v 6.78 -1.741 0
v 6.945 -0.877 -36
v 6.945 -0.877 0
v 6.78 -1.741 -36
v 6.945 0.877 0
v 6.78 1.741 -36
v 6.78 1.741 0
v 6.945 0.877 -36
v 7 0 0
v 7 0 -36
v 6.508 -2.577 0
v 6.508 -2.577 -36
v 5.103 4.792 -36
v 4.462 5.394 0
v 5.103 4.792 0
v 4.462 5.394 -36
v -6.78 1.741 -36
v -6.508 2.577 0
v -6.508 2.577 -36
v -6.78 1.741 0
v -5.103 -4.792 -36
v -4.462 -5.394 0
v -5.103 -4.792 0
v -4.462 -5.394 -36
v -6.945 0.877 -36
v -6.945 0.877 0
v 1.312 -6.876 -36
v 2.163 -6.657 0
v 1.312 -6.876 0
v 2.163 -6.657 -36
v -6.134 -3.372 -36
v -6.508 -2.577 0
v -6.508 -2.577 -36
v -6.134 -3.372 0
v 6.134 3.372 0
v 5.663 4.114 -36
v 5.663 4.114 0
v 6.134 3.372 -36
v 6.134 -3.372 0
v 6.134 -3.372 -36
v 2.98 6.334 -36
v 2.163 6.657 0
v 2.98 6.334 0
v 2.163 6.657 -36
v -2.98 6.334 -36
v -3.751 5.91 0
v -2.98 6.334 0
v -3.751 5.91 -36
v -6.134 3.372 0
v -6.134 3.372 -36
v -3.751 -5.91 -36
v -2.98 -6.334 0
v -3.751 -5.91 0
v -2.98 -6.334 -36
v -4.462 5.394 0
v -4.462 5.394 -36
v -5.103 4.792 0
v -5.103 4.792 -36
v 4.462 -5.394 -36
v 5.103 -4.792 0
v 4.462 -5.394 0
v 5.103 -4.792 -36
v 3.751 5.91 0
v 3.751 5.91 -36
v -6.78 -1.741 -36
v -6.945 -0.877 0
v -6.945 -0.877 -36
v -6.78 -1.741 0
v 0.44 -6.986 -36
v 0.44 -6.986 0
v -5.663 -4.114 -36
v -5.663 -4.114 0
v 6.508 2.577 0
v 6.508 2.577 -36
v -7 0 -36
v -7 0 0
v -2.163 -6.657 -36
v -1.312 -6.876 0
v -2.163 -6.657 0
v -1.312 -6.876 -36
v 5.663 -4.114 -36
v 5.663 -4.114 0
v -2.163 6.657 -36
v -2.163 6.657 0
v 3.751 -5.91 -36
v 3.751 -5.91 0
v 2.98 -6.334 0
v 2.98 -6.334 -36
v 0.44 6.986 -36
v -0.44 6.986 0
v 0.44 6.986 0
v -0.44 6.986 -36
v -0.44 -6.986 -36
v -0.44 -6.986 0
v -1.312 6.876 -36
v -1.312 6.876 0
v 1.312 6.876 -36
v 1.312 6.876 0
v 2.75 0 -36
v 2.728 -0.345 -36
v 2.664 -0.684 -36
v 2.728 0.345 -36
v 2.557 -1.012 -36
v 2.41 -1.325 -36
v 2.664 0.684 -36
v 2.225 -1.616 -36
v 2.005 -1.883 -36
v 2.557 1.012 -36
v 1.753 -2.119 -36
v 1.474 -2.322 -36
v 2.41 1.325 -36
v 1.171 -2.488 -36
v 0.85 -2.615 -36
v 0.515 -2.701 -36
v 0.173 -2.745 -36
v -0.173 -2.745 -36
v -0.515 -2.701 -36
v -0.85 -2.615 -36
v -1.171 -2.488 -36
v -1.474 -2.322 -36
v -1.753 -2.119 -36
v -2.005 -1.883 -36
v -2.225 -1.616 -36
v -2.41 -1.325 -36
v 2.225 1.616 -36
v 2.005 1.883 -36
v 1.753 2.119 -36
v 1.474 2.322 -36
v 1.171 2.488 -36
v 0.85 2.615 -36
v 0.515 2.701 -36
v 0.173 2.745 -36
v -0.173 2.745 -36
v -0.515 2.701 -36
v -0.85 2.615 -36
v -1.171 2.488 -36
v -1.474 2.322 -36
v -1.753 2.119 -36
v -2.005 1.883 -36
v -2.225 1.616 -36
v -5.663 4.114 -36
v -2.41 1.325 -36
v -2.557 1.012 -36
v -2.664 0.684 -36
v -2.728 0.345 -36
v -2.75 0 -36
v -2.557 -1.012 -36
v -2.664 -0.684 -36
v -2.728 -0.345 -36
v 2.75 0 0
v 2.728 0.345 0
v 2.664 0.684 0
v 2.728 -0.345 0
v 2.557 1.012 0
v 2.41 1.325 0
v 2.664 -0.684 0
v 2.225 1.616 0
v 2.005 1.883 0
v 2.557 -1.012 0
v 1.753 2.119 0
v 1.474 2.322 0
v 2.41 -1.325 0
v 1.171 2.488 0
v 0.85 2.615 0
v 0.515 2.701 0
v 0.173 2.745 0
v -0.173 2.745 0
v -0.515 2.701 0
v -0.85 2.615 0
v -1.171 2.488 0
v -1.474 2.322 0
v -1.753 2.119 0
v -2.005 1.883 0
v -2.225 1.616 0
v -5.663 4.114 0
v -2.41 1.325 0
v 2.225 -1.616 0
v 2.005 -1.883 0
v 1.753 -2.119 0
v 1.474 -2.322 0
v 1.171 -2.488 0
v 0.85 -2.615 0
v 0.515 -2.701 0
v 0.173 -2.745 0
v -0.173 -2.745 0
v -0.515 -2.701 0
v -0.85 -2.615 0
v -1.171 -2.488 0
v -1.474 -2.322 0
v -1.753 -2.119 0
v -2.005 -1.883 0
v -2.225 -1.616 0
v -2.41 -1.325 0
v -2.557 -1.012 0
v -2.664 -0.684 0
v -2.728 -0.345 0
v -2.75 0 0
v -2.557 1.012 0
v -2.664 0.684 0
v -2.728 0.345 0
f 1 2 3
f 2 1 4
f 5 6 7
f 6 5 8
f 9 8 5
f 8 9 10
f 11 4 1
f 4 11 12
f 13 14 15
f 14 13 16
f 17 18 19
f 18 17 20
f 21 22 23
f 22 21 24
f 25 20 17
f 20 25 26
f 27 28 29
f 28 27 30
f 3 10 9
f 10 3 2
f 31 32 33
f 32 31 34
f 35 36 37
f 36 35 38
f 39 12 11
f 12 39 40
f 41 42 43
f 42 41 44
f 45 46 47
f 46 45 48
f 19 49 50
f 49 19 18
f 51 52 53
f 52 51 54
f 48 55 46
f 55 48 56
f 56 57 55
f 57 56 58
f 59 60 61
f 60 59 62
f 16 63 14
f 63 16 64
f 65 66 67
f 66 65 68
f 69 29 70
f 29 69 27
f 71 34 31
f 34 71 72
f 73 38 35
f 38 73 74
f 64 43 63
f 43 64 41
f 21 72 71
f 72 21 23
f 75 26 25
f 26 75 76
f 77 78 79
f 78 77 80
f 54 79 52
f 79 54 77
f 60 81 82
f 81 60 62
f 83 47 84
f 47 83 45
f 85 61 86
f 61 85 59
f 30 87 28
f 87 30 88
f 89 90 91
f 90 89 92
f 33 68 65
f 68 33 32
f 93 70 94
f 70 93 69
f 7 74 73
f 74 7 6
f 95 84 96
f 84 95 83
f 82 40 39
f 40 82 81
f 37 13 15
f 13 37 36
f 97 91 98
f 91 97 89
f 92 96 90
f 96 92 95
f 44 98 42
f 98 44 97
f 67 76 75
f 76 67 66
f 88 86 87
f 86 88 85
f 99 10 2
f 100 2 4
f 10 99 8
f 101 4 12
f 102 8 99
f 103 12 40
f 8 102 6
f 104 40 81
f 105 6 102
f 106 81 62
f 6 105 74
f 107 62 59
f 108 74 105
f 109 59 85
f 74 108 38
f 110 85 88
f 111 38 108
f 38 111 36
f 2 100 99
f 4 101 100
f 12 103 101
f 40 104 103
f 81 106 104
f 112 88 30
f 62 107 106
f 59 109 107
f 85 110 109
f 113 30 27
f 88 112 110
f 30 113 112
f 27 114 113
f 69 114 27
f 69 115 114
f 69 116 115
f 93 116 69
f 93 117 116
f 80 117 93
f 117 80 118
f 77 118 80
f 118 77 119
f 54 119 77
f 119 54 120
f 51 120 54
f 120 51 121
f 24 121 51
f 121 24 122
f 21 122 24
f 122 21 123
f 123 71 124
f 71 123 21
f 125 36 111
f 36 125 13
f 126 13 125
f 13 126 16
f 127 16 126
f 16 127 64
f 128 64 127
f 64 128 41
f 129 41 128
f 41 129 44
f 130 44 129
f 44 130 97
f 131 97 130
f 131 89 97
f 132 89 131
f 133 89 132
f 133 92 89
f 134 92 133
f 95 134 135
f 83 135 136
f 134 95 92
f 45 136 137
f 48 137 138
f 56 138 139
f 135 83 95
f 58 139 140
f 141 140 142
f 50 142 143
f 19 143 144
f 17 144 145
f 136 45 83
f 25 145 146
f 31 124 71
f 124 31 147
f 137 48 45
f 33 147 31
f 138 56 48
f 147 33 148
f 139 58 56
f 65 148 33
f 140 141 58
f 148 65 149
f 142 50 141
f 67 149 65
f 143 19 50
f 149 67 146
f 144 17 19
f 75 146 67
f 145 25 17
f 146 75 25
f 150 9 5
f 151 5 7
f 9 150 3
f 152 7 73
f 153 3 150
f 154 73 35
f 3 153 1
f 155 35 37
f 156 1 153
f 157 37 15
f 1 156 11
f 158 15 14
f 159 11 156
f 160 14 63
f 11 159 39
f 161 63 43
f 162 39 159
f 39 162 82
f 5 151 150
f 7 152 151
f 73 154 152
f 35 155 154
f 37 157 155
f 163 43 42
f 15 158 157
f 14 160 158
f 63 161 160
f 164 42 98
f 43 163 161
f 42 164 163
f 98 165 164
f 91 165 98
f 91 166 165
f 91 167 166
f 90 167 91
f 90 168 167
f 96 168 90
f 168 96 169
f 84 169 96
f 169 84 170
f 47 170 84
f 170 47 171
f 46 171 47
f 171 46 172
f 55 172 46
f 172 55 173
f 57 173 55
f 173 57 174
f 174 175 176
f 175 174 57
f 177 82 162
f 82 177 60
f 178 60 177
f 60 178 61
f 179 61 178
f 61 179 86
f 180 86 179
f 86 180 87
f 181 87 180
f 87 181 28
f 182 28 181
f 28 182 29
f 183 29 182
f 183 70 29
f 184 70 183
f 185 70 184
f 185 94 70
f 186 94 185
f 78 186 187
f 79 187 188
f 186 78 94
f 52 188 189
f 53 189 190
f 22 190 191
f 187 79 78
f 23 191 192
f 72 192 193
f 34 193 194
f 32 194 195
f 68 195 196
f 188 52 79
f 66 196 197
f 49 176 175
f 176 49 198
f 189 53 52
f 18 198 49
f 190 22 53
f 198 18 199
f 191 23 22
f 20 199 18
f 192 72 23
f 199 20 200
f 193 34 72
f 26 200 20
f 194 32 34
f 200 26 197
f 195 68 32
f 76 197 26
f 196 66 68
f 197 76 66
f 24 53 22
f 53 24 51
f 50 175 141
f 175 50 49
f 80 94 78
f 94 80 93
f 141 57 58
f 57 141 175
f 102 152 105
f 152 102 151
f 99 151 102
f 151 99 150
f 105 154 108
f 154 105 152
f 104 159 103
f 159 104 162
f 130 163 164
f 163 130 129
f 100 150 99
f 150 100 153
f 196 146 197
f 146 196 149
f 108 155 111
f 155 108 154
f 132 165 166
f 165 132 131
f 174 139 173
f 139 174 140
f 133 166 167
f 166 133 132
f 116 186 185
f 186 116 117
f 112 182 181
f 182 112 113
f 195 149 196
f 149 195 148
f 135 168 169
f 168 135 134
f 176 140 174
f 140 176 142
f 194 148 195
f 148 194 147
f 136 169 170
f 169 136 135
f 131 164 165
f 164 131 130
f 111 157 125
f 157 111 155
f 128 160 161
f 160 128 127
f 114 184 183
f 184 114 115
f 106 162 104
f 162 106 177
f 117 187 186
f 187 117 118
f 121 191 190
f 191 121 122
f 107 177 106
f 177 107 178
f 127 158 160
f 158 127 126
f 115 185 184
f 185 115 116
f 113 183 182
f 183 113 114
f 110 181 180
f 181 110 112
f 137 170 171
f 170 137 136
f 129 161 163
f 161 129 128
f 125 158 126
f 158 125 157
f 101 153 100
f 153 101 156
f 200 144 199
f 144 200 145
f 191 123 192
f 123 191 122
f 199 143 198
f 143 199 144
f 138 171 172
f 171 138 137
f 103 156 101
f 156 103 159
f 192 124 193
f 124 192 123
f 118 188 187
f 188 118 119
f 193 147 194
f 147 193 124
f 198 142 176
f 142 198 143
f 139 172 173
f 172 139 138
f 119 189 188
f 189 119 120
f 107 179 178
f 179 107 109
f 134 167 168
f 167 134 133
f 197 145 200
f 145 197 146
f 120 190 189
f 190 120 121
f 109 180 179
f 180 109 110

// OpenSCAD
$fn = 50;


difference() {
	union() {
		translate(v = [0, 0, -36.0000000000]) {
			cylinder(h = 36, r = 7.0000000000);
		}
		cylinder(h = 0, r = 13.0000000000);
	}
	union() {
		#translate(v = [0, 0, -36]) {
			cylinder(h = 36, r = 2.7500000000);
		}
	}
}
